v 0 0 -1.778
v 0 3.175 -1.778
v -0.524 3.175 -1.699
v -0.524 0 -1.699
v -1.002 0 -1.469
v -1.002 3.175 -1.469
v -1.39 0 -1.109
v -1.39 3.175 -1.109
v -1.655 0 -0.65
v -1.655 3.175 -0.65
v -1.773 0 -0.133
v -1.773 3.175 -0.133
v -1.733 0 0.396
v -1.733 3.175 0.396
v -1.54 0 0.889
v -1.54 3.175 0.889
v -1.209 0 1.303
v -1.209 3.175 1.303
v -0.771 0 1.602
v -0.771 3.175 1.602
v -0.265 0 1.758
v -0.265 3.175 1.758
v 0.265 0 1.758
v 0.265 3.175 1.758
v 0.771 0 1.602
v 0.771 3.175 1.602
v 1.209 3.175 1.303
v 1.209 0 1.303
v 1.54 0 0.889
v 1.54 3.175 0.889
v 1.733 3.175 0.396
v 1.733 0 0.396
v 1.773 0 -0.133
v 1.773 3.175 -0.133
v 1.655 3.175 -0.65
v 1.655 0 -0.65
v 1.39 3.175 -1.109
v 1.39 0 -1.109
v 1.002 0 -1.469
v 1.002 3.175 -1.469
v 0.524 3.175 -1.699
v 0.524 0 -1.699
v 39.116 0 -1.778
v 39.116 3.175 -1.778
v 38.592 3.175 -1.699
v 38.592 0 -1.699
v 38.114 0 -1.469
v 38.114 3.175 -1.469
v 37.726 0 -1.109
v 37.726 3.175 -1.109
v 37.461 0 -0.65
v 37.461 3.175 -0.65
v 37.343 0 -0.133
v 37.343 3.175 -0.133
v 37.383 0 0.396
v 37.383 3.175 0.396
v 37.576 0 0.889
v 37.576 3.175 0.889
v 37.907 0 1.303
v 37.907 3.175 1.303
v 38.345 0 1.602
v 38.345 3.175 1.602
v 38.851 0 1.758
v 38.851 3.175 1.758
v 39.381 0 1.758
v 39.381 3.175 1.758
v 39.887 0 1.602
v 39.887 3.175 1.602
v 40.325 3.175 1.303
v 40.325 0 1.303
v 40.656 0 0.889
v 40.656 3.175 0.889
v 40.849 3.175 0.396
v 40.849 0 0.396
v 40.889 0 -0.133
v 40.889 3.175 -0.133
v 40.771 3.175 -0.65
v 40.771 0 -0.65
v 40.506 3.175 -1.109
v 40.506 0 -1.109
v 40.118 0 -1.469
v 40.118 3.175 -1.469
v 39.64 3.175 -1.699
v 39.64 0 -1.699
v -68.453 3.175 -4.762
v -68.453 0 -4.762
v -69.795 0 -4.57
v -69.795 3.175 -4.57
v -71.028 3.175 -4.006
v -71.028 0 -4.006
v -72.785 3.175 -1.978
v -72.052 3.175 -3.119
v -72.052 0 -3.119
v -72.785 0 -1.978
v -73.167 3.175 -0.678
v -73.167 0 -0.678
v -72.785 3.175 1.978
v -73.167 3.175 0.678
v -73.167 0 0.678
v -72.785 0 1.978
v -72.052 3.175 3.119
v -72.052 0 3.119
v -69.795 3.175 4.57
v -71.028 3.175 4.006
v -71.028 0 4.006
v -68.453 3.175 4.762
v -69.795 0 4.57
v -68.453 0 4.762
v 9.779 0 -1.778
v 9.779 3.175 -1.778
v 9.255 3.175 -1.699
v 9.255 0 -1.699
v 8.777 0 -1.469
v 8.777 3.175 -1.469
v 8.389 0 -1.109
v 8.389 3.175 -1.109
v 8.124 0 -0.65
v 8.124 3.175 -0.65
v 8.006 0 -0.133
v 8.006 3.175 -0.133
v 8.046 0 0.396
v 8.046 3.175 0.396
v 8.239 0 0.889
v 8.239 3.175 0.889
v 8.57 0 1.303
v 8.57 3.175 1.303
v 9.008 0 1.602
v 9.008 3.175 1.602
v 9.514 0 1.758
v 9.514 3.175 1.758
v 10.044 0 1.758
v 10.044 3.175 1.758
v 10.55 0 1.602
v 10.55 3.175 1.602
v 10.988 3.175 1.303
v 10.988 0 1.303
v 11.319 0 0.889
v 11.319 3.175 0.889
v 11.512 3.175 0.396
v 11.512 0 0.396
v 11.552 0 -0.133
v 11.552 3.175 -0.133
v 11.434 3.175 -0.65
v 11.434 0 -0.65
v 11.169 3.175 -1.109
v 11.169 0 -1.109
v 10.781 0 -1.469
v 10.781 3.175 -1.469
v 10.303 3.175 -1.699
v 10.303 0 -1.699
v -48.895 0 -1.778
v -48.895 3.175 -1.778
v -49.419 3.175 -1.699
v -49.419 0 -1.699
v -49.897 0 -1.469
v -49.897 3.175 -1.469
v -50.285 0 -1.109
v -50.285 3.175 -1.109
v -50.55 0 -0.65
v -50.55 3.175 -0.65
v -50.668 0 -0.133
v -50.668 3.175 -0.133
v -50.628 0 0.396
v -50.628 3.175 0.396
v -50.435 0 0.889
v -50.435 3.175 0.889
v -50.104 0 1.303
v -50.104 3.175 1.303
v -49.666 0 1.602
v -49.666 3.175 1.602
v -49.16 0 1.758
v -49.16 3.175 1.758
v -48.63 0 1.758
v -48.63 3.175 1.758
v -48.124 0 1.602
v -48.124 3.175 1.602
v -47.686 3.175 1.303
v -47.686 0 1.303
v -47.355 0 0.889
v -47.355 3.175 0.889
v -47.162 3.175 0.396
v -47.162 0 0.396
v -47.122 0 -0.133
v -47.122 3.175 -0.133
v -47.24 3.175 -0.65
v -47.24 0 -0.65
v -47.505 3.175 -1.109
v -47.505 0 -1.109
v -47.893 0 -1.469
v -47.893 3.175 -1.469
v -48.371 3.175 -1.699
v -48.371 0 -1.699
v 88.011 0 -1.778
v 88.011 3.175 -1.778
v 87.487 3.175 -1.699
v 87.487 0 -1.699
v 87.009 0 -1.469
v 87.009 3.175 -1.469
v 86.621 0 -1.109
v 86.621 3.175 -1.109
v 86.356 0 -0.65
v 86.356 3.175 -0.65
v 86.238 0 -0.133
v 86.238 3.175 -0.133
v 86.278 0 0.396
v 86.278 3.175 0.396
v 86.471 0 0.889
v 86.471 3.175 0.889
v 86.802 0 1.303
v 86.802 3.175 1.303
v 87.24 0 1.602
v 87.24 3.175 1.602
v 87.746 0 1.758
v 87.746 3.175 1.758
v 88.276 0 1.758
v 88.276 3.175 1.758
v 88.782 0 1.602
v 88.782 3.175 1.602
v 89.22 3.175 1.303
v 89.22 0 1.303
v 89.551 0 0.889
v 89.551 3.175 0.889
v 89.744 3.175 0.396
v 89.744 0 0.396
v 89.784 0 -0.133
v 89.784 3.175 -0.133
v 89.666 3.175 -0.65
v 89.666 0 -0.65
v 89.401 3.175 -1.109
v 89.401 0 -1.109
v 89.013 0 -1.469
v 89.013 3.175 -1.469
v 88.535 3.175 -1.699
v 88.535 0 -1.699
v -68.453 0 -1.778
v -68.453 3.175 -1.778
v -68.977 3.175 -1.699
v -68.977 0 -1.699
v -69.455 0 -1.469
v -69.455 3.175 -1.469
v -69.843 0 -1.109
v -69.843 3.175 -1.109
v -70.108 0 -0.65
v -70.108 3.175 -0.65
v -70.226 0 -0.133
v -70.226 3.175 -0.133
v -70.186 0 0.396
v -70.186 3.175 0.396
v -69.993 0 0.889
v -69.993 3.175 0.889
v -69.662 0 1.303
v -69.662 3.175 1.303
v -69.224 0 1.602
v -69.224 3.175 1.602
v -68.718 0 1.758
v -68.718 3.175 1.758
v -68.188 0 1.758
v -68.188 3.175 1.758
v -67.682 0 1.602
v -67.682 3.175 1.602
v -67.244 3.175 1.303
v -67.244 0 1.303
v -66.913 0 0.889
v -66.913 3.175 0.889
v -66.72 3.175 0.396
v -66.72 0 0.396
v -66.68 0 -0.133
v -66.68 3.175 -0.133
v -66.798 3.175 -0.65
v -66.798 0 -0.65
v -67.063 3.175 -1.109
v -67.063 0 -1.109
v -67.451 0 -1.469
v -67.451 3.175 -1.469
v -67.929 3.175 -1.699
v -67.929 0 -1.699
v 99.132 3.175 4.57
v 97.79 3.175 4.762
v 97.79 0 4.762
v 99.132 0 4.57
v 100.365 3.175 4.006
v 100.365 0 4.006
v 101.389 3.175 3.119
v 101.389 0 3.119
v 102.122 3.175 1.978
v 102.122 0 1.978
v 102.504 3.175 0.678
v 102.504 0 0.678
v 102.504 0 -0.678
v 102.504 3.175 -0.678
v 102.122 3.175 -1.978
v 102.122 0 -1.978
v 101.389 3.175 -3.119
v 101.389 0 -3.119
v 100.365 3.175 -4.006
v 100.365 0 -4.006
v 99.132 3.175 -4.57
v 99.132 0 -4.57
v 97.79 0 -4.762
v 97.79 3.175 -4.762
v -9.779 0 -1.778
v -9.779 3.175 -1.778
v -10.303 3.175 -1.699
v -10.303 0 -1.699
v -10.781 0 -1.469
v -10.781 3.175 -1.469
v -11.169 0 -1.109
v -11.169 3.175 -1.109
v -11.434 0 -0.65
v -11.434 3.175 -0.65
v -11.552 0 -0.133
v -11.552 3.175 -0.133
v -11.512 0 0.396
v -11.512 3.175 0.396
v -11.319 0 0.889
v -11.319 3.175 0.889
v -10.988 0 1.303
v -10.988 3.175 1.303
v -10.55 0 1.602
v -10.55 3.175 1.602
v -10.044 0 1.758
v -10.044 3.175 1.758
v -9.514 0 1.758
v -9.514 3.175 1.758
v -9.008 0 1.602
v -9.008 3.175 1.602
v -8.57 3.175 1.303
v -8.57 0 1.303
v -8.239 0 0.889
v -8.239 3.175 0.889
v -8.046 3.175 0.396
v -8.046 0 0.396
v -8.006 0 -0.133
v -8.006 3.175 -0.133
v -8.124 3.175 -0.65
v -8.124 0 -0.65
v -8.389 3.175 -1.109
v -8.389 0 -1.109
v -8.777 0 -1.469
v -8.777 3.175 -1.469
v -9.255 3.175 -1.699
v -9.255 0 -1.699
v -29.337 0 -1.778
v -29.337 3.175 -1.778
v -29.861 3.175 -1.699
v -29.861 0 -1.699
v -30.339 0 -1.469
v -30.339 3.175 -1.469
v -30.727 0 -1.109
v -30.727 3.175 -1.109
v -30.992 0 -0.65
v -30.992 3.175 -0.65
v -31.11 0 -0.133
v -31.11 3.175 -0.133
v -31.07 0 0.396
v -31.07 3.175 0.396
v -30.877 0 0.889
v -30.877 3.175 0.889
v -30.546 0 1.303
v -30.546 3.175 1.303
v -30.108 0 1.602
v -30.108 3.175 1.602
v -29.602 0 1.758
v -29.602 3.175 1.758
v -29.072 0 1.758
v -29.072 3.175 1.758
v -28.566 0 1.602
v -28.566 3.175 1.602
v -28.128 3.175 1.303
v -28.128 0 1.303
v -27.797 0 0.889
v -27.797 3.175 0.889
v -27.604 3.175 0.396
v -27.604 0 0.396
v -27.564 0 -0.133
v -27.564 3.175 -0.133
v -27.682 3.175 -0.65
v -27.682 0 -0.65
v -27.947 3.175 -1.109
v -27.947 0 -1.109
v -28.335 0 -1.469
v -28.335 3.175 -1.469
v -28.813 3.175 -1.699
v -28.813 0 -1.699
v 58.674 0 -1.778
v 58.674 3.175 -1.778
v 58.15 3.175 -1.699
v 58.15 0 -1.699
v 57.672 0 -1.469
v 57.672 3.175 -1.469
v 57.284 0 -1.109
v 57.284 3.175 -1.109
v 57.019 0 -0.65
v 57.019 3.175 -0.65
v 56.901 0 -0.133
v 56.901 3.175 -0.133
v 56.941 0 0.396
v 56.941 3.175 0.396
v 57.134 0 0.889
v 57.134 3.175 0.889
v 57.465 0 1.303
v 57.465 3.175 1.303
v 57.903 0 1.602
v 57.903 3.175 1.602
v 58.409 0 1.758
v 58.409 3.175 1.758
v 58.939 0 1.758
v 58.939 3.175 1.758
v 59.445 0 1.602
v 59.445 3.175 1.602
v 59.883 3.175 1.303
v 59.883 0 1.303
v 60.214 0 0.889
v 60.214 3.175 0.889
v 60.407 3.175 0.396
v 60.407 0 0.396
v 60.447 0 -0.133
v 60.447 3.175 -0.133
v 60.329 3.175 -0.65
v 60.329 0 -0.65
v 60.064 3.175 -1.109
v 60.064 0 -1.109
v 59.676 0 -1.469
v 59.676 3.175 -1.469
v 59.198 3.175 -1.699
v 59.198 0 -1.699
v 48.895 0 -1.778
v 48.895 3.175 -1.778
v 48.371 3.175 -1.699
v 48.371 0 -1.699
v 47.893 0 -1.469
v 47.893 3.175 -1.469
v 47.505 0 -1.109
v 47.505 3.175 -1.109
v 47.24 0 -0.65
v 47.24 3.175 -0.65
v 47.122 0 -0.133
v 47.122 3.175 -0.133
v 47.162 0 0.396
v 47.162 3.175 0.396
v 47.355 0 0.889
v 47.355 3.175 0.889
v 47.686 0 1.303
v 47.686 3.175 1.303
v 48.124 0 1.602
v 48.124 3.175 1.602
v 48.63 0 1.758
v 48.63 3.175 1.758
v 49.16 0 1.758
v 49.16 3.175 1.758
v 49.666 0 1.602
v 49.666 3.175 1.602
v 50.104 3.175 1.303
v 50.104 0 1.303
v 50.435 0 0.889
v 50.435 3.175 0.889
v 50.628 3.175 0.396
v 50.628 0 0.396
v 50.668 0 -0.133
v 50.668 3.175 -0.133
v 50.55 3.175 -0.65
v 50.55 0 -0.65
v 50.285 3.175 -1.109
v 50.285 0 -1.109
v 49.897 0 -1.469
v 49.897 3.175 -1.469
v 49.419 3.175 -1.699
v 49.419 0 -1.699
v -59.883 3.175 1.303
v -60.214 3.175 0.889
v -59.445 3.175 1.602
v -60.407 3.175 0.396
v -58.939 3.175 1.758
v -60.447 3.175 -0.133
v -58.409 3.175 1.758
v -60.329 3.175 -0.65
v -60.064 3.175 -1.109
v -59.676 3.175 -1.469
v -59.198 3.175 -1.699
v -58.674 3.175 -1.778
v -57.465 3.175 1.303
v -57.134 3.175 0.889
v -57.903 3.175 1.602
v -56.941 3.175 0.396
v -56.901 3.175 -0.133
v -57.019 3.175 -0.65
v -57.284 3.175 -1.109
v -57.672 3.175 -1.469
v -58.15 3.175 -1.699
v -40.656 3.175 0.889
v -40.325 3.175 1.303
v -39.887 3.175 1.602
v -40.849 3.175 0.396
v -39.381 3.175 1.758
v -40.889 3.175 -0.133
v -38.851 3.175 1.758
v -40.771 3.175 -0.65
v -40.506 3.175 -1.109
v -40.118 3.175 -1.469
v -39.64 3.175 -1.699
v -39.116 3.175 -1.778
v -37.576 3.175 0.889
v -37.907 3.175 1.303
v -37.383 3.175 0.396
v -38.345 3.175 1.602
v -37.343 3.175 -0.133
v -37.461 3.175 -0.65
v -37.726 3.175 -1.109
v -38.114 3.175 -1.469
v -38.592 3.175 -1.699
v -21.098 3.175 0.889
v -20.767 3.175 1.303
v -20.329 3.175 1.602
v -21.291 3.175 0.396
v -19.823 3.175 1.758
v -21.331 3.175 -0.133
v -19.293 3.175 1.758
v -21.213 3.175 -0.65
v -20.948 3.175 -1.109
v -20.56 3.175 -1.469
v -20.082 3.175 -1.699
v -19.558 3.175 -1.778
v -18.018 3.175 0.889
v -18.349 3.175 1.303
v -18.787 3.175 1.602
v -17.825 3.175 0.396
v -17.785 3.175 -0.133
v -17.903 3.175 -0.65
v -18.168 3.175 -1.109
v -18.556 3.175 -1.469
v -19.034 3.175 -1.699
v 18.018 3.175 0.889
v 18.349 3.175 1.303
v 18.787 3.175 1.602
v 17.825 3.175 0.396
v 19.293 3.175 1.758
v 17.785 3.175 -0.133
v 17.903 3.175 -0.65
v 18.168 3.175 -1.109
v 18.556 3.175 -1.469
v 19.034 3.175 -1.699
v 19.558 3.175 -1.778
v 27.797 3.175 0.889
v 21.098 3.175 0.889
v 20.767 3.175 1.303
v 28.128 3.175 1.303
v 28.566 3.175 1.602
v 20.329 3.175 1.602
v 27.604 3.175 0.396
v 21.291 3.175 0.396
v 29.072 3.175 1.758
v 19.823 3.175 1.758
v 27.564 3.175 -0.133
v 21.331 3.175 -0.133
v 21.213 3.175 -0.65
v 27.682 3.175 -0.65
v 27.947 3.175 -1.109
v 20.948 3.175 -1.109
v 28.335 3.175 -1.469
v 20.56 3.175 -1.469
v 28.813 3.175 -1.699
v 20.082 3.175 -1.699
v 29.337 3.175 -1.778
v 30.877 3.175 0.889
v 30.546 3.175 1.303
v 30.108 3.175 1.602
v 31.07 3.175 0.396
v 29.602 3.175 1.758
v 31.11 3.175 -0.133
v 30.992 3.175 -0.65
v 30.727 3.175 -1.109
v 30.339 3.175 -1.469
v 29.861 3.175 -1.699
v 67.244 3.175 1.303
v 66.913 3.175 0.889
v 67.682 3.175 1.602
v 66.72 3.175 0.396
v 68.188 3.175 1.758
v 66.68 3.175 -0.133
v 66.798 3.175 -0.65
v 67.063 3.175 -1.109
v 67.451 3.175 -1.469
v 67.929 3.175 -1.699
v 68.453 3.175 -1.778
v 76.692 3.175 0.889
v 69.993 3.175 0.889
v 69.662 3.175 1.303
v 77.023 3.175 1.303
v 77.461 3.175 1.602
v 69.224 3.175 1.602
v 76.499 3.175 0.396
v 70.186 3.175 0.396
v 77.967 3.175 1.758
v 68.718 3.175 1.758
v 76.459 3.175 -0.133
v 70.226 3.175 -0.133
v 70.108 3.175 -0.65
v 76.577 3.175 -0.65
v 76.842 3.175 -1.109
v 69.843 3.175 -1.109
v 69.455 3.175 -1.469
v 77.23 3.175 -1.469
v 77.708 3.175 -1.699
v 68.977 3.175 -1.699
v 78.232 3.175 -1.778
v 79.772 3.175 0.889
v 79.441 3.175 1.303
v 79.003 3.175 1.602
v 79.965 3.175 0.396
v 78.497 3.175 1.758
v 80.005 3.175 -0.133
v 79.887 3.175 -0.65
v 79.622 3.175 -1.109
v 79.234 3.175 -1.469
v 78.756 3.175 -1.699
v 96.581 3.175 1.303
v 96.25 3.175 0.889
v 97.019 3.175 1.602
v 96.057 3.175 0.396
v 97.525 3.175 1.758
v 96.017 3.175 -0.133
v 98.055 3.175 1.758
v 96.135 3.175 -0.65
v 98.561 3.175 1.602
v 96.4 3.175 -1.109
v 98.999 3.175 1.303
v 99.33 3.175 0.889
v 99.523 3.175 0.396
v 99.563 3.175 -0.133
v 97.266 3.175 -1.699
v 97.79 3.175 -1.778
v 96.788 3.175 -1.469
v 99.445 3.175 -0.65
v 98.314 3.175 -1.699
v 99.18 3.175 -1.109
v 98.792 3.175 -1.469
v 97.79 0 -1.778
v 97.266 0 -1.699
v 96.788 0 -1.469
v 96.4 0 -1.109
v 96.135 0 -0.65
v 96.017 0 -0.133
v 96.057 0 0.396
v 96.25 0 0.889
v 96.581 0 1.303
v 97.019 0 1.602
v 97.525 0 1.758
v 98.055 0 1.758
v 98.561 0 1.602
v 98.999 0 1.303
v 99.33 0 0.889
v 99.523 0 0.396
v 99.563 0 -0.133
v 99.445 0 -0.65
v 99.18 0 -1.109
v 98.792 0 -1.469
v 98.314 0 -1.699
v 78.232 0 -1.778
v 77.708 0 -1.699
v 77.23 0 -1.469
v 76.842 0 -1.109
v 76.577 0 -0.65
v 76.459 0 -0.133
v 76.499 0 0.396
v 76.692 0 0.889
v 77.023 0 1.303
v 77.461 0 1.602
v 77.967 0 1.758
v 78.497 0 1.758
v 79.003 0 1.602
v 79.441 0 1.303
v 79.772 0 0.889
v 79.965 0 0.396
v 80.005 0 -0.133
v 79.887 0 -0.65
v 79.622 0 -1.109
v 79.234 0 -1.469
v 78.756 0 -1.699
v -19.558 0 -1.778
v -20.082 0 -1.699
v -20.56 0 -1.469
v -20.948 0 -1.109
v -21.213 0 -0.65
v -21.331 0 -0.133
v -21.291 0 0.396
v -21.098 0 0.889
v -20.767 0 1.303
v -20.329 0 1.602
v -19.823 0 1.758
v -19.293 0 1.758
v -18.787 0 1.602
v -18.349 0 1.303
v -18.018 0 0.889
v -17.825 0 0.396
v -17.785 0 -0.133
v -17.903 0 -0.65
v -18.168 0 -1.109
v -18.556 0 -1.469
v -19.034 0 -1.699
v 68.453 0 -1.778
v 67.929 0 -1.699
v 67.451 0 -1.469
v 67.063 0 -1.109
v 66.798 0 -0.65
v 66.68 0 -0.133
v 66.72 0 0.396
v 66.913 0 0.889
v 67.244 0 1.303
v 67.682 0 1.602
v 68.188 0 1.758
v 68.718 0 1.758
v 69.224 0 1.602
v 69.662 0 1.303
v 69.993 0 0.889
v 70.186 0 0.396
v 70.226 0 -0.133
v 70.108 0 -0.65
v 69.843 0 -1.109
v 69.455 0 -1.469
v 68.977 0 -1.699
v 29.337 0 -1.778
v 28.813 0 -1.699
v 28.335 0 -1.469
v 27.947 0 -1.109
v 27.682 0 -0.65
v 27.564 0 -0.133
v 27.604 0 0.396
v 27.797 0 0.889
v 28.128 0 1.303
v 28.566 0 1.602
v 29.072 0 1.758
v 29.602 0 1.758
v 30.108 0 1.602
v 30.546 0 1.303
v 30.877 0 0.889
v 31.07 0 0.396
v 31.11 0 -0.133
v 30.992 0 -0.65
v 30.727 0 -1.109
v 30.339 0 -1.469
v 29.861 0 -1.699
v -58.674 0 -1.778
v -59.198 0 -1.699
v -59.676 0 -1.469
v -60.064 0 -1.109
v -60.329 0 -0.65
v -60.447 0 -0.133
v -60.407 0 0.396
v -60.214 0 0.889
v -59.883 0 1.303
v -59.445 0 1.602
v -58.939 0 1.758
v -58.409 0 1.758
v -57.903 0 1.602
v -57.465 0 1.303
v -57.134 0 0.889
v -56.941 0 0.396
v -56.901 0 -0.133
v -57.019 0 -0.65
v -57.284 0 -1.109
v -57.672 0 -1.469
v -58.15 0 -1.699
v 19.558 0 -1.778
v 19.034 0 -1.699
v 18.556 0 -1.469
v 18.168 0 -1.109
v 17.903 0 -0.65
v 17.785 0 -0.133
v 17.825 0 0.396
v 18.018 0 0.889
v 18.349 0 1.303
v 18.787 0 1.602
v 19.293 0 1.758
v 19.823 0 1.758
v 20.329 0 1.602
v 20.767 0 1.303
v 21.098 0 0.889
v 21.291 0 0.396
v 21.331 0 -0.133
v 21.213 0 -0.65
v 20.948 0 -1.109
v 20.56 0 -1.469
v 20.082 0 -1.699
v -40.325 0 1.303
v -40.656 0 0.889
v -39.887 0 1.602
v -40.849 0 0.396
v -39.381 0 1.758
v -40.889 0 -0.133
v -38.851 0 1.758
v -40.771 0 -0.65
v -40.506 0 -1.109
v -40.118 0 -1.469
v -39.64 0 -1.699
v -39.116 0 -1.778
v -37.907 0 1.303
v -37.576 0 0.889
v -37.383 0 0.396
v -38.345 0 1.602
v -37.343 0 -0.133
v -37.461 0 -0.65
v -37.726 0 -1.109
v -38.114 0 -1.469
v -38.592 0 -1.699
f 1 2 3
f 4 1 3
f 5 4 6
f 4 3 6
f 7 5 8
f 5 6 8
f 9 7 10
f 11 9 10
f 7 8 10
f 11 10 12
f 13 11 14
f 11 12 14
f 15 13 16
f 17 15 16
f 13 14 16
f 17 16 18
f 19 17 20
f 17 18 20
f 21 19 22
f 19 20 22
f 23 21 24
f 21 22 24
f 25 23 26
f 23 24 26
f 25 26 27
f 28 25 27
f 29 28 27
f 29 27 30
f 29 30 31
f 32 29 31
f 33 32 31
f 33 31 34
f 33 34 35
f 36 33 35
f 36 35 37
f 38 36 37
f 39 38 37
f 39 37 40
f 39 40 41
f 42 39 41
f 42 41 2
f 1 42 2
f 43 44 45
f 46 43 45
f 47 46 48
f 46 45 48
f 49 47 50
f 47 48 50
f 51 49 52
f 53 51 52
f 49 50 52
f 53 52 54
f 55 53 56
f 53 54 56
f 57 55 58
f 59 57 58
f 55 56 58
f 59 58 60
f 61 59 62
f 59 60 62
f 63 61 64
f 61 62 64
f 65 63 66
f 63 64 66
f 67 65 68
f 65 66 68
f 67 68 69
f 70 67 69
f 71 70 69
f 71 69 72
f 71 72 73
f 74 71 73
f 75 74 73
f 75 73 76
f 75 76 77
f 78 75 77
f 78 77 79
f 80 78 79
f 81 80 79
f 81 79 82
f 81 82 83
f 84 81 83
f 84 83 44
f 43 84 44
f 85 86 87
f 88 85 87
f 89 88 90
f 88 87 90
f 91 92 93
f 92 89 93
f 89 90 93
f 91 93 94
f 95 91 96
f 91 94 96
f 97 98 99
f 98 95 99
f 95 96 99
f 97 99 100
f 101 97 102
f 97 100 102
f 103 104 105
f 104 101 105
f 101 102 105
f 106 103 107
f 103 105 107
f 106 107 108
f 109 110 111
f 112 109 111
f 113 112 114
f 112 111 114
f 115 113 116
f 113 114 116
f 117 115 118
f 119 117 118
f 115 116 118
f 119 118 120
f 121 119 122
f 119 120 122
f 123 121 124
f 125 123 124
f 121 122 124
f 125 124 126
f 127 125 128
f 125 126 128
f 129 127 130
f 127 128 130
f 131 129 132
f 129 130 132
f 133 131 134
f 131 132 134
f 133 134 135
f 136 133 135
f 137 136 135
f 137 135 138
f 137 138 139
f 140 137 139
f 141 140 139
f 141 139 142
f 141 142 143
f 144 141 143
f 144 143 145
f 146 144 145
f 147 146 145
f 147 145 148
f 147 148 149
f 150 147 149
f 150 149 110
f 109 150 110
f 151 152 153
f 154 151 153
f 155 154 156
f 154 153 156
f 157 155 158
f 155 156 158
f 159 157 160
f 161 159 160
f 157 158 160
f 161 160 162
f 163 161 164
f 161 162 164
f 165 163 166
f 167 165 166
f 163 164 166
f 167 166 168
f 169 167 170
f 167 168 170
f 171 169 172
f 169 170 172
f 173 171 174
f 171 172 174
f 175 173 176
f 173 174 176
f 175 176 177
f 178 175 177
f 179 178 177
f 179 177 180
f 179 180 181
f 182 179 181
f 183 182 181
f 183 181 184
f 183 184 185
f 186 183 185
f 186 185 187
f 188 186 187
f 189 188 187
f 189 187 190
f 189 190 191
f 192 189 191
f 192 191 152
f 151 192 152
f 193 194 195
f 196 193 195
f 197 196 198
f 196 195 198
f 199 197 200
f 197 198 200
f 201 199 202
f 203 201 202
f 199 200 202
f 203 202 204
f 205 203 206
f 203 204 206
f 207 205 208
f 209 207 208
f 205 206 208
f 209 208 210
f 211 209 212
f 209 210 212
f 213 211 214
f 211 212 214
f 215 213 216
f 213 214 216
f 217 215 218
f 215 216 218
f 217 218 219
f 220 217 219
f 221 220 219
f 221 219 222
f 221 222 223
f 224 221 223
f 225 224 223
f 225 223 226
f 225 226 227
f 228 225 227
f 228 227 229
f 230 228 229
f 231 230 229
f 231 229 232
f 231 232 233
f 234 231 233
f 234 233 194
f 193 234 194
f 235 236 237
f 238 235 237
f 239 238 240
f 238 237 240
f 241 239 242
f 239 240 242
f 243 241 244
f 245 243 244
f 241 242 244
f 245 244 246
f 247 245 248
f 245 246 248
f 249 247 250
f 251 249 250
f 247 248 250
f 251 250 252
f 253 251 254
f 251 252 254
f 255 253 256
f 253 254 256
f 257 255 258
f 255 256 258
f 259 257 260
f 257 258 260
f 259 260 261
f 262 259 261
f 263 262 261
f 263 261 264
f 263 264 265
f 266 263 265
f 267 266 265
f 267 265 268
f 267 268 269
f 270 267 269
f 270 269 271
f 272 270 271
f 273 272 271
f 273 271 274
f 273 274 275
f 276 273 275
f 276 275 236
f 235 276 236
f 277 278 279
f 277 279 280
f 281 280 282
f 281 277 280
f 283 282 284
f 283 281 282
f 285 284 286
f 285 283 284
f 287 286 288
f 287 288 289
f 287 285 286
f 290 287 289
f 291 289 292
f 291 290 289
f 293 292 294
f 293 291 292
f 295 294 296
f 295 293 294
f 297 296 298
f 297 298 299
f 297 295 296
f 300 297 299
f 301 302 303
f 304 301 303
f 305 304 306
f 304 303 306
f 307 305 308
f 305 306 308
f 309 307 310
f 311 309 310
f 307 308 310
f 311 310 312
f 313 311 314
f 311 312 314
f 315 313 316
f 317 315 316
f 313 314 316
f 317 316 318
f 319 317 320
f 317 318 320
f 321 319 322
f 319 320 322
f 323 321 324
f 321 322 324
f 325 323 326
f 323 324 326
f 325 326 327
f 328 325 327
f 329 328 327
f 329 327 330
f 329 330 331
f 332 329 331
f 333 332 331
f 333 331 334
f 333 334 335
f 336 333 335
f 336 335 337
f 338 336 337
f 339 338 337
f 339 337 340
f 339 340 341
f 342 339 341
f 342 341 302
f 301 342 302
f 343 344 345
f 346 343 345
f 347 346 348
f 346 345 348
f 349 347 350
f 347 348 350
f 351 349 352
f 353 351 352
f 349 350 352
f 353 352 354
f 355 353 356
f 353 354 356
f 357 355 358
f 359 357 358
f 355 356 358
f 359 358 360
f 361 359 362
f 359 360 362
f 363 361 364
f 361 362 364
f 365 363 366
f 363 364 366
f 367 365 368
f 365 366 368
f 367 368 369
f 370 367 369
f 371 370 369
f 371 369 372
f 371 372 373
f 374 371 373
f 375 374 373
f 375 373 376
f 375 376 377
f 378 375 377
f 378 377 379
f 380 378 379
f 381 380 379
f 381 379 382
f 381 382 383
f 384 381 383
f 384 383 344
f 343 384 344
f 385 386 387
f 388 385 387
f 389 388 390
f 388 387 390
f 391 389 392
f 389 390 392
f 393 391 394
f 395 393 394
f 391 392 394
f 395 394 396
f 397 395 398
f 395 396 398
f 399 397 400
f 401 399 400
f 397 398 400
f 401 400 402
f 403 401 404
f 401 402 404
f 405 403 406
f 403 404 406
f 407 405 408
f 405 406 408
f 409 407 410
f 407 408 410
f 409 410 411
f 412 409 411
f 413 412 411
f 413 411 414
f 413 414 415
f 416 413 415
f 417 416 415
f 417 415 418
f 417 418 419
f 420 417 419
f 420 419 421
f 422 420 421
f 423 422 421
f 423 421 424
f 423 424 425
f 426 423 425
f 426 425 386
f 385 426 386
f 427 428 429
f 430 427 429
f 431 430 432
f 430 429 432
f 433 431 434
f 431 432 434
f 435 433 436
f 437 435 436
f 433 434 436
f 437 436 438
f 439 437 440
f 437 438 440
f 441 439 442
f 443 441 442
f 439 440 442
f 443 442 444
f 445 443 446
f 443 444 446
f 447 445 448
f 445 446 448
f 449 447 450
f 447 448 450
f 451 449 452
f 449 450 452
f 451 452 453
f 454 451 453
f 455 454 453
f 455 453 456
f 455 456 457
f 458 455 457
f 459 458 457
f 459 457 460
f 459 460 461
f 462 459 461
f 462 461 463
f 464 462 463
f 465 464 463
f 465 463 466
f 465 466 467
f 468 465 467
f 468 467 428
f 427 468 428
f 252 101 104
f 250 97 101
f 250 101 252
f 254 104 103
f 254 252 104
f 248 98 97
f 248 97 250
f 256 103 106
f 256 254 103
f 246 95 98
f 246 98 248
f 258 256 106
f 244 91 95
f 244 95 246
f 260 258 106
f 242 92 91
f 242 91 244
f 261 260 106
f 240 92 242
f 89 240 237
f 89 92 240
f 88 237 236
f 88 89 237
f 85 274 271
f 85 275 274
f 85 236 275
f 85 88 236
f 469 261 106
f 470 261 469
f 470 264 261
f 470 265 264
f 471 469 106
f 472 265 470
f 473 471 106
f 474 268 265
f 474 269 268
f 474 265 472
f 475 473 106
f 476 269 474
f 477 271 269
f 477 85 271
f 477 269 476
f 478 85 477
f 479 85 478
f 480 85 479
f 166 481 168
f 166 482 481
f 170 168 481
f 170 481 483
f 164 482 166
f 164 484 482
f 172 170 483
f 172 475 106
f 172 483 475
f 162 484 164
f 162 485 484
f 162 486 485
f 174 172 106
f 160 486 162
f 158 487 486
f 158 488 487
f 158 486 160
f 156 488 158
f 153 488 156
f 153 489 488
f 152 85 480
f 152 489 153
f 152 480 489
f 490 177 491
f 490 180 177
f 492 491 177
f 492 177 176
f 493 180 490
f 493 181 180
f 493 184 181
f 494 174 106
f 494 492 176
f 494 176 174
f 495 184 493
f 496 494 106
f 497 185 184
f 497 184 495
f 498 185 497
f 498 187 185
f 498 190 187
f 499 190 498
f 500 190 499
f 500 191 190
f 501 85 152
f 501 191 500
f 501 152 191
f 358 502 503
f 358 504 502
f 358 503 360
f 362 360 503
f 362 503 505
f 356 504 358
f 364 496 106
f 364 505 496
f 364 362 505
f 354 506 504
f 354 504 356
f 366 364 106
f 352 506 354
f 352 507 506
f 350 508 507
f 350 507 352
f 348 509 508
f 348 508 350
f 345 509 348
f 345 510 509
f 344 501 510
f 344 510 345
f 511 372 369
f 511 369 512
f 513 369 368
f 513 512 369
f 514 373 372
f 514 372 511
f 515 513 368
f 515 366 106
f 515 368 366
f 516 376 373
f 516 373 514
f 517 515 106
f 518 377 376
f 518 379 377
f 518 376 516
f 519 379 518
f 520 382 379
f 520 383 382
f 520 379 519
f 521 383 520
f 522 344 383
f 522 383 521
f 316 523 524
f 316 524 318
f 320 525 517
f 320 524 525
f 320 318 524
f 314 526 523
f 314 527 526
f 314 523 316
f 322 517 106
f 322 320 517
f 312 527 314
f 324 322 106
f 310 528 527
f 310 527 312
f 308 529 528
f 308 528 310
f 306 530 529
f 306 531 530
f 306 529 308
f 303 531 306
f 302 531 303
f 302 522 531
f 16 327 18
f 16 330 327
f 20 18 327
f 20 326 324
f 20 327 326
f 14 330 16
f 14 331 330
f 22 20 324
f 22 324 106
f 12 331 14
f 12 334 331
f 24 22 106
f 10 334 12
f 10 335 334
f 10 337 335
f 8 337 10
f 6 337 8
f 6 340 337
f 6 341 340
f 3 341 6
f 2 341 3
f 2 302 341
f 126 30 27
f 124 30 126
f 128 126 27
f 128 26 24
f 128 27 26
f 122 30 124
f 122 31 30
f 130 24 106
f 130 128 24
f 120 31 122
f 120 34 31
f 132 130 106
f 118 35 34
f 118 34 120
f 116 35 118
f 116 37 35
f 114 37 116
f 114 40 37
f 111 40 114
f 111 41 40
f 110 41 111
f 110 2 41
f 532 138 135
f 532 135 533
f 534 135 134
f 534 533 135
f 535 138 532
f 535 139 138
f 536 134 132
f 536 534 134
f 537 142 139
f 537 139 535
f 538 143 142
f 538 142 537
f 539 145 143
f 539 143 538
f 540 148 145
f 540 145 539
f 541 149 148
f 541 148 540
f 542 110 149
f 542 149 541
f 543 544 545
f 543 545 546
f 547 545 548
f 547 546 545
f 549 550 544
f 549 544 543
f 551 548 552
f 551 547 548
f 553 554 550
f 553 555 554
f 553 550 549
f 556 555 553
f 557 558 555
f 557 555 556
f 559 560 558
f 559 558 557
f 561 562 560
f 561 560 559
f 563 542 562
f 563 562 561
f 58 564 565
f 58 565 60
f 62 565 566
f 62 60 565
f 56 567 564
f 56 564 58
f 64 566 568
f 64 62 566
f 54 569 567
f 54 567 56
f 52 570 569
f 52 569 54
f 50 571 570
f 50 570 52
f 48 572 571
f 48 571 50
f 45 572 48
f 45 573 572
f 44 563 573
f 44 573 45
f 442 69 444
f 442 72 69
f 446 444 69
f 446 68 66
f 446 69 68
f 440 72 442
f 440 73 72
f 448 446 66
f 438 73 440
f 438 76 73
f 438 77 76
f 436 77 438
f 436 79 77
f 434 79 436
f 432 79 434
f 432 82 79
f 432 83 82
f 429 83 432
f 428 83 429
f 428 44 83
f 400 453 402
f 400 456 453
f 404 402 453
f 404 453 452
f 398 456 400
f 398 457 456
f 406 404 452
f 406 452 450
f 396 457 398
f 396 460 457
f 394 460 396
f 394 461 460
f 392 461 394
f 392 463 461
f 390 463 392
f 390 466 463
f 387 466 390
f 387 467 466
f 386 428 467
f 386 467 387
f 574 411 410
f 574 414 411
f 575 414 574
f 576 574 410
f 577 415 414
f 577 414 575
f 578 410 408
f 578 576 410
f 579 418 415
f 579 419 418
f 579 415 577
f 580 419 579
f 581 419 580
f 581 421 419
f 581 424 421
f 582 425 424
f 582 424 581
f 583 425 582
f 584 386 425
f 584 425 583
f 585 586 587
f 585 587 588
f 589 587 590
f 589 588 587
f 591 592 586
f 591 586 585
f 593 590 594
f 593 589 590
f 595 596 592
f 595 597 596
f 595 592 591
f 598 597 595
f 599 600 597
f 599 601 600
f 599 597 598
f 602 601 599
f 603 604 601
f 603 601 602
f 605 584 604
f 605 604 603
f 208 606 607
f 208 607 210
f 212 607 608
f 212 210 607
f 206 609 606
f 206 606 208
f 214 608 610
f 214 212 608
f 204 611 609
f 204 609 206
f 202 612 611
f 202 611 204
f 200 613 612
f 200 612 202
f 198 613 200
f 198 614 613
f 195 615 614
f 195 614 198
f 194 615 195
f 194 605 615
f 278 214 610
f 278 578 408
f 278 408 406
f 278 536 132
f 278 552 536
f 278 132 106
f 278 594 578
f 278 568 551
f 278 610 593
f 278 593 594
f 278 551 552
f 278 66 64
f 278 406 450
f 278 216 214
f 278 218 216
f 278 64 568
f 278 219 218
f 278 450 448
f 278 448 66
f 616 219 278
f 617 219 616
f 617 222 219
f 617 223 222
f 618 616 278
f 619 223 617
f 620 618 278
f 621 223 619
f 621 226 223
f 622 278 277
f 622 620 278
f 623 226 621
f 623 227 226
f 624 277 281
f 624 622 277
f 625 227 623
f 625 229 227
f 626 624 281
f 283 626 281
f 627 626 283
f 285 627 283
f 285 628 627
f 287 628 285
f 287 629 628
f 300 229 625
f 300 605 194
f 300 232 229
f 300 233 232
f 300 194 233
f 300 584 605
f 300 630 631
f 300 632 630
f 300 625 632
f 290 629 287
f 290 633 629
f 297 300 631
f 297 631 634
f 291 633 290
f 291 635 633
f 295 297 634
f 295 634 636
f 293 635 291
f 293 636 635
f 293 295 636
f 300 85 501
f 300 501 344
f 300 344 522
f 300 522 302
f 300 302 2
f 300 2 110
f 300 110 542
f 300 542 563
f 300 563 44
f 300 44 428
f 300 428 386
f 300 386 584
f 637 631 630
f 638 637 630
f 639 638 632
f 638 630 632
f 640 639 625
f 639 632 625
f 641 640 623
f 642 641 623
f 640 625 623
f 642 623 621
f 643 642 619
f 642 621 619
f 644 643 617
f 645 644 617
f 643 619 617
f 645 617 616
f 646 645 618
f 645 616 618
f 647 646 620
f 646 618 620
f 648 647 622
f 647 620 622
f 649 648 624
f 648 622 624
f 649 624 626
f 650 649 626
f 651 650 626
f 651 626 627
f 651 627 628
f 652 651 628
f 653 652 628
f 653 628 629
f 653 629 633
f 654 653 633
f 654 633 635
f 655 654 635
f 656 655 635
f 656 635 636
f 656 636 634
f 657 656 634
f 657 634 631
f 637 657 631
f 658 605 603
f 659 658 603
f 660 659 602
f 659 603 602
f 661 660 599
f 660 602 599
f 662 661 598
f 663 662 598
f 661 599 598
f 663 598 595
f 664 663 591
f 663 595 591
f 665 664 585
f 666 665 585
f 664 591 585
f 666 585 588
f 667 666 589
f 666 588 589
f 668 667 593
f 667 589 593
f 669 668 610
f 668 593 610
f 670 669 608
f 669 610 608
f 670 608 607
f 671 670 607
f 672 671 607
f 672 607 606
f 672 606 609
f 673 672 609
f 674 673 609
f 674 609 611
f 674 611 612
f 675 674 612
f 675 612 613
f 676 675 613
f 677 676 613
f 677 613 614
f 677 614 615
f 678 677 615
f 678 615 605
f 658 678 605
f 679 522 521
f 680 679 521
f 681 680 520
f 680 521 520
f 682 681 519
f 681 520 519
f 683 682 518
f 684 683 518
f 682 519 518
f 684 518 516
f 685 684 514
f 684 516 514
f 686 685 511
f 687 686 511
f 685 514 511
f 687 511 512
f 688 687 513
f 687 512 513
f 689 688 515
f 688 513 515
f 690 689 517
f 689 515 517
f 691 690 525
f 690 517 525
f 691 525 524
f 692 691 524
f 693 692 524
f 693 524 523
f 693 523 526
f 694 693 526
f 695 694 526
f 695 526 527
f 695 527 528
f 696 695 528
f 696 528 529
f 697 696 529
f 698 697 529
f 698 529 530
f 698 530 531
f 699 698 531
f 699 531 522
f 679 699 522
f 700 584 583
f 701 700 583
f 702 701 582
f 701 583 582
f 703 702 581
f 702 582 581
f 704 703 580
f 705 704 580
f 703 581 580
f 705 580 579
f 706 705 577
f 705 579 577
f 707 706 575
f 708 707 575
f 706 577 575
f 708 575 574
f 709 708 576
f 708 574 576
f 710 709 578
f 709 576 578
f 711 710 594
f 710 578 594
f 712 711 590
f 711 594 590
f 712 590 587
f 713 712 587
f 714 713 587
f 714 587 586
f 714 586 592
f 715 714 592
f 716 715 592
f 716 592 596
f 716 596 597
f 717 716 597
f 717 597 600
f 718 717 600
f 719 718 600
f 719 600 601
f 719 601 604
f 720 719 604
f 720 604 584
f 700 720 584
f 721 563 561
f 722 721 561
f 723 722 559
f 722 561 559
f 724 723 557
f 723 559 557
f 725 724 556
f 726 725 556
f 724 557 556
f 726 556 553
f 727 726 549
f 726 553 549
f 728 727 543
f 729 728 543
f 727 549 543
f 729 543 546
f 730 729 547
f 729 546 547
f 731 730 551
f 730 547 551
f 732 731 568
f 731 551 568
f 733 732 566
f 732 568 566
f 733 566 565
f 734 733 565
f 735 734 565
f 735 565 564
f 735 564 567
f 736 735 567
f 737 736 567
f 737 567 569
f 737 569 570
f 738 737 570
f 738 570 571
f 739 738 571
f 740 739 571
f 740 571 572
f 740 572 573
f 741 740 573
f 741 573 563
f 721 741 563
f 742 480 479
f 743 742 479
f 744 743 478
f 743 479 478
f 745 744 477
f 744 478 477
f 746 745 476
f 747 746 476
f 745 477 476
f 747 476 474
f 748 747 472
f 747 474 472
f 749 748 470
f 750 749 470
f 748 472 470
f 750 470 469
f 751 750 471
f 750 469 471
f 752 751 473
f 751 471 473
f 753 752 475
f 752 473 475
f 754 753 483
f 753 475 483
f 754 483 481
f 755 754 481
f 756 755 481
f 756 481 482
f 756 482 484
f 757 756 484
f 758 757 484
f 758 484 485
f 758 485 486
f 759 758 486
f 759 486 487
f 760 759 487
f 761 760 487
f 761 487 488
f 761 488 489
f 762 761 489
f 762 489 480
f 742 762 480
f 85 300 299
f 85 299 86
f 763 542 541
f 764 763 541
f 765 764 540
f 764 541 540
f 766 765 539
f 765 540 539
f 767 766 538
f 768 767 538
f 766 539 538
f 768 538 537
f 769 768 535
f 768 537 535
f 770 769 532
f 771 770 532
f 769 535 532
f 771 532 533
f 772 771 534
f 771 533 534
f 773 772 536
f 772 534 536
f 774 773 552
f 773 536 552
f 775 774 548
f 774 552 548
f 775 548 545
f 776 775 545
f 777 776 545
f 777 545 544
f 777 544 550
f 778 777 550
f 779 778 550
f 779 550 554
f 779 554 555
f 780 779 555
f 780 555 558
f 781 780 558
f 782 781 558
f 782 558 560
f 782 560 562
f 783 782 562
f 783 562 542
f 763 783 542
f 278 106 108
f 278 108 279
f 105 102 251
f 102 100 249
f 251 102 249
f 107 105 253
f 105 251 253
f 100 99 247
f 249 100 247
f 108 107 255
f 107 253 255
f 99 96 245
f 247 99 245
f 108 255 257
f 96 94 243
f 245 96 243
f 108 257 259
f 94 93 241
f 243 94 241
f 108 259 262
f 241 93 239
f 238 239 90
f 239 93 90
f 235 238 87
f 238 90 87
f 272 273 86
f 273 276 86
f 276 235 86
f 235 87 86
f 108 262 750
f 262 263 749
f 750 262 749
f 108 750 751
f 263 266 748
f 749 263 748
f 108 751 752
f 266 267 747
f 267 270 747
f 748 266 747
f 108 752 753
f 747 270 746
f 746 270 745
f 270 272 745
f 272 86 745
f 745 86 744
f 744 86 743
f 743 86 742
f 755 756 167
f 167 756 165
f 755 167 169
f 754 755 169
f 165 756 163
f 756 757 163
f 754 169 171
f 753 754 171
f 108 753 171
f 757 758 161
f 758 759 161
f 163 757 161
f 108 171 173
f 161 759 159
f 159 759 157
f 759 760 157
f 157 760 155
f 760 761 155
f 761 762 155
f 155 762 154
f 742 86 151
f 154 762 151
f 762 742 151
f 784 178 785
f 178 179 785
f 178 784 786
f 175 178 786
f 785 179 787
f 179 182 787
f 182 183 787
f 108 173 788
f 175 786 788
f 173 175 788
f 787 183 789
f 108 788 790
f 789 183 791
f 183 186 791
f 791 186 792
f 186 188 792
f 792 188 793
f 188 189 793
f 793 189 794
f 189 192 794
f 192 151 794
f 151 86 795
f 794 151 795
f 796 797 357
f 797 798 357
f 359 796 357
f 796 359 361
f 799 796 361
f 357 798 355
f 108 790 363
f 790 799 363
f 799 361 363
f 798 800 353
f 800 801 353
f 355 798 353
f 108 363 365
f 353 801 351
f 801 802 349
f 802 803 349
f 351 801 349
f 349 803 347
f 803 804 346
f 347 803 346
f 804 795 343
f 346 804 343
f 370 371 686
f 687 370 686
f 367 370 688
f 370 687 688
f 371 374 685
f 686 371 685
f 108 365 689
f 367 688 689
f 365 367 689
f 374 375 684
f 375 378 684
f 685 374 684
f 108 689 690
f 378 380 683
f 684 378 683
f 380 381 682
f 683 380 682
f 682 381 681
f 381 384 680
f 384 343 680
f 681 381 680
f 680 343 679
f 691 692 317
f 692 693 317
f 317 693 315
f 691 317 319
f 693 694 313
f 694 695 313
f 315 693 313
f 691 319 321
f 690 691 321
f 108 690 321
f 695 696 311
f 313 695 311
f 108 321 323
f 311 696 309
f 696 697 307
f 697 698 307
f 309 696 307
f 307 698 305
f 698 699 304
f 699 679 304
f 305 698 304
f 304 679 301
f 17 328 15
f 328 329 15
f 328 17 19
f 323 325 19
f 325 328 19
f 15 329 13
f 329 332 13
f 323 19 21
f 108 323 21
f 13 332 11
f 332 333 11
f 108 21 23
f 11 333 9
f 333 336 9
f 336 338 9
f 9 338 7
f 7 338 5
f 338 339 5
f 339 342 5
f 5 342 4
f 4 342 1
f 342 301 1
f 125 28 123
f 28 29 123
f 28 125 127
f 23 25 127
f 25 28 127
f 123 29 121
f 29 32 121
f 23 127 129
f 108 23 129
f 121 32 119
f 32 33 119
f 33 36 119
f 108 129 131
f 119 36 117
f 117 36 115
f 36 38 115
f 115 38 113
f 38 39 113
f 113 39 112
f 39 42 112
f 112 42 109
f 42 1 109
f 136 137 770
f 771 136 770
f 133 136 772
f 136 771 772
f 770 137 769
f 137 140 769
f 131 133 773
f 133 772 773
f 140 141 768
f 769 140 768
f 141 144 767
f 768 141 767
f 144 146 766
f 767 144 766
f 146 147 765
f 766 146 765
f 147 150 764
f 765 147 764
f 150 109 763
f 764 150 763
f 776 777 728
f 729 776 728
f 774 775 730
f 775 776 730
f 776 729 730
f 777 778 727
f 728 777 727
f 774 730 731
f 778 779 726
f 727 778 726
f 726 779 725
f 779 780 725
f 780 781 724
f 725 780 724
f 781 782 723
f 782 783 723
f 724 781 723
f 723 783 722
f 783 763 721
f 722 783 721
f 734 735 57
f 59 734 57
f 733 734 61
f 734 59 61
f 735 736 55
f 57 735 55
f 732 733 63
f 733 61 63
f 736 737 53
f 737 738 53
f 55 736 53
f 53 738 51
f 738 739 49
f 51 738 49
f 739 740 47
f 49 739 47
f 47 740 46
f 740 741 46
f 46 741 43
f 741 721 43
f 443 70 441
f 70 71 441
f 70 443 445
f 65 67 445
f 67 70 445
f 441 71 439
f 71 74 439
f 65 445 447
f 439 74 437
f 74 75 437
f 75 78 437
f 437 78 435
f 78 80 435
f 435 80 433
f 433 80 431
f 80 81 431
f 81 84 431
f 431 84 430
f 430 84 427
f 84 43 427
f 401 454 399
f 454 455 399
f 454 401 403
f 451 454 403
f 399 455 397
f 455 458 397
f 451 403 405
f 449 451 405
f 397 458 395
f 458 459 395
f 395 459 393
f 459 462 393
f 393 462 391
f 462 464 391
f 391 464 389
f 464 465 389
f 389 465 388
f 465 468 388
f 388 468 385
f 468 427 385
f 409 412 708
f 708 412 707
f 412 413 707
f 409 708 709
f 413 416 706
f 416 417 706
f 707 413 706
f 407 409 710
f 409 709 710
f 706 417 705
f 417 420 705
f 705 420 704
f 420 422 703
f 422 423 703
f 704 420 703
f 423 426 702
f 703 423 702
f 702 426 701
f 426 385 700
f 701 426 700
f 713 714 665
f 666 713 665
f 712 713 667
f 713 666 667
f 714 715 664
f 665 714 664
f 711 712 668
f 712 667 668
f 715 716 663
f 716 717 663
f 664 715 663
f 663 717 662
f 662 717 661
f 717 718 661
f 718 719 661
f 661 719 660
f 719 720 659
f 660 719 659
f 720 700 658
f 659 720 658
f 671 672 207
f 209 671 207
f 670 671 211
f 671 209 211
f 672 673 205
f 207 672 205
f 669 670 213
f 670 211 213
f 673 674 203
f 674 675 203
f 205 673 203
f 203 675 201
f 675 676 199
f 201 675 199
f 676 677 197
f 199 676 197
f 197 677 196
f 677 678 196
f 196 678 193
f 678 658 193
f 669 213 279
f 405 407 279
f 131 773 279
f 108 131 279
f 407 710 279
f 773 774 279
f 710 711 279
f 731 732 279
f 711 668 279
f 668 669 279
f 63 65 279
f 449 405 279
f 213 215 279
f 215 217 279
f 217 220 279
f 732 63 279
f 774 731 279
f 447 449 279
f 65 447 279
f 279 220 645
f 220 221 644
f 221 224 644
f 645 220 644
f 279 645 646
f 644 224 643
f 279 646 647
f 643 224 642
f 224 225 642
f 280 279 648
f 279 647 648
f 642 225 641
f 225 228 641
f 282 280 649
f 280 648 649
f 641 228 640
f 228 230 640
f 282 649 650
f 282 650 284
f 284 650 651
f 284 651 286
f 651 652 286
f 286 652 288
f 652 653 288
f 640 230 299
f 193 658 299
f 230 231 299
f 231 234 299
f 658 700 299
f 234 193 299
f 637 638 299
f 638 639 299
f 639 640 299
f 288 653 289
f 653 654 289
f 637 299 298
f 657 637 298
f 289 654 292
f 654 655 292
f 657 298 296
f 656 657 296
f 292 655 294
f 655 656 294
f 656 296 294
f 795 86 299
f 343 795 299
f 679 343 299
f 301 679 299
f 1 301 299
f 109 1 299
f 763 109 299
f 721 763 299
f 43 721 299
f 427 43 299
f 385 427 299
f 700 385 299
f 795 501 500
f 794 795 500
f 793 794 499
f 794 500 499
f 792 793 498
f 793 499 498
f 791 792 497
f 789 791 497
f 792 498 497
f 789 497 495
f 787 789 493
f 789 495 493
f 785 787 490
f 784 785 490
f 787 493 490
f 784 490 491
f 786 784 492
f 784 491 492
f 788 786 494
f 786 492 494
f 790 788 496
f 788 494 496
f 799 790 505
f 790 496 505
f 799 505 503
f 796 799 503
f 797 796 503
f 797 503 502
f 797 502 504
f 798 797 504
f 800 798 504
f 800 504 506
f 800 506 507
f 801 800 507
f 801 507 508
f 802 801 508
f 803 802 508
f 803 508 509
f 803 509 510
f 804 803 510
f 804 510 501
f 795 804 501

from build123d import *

# Parameters (mm, degrees)
SKETCH1_R               = 1.778
BOSS_EXTRUDE1_DEPTH     = 6.35
CUT_EXTRUDE1_DEPTH      = 103.859220114
CUT_EXTRUDE1_DEPTH_BACK = 103.859220114
SKETCH3_W               = 243.845776737
SKETCH3_H               = 94.534413445
CUT_EXTRUDE2_DEPTH      = 3.175


with BuildPart() as part:
    # Sketch1 → Boss-Extrude1 (new body)
    with BuildSketch(Plane(origin=(0, 6.35, 0), x_dir=(1, 0, 0), z_dir=(0, 1, 0))):
        with BuildLine():
            Line((97.79, 4.7625), (-97.79, 4.7625))
            ThreePointArc((-97.79, 4.7625), (-102.5525, 0), (-97.79, -4.7625))
            Line((-97.79, -4.7625), (97.79, -4.7625))
            ThreePointArc((97.79, -4.7625), (102.5525, 0), (97.79, 4.7625))
        make_face()
        with Locations(Location((97.79, 0, 0), (0, 0, 90))):
            Circle(SKETCH1_R, mode=Mode.SUBTRACT)
        with Locations(Location((88.011, 0, 0), (0, 0, 90))):
            Circle(SKETCH1_R, mode=Mode.SUBTRACT)
        with Locations(Location((78.232, 0, 0), (0, 0, 90))):
            Circle(SKETCH1_R, mode=Mode.SUBTRACT)
        with Locations(Location((68.453, 0, 0), (0, 0, 90))):
            Circle(SKETCH1_R, mode=Mode.SUBTRACT)
        with Locations(Location((58.674, 0, 0), (0, 0, 90))):
            Circle(SKETCH1_R, mode=Mode.SUBTRACT)
        with Locations(Location((48.895, 0, 0), (0, 0, 90))):
            Circle(SKETCH1_R, mode=Mode.SUBTRACT)
        with Locations(Location((39.116, 0, 0), (0, 0, 90))):
            Circle(SKETCH1_R, mode=Mode.SUBTRACT)
        with Locations(Location((29.337, 0, 0), (0, 0, 90))):
            Circle(SKETCH1_R, mode=Mode.SUBTRACT)
        with Locations(Location((19.558, 0, 0), (0, 0, 90))):
            Circle(SKETCH1_R, mode=Mode.SUBTRACT)
        with Locations(Location((9.779, 0, 0), (0, 0, 90))):
            Circle(SKETCH1_R, mode=Mode.SUBTRACT)
        with Locations(Location((0, 0, 0), (0, 0, 90))):
            Circle(SKETCH1_R, mode=Mode.SUBTRACT)
        with Locations(Location((-9.779, 0, 0), (0, 0, 90))):
            Circle(SKETCH1_R, mode=Mode.SUBTRACT)
        with Locations(Location((-19.558, 0, 0), (0, 0, 90))):
            Circle(SKETCH1_R, mode=Mode.SUBTRACT)
        with Locations(Location((-29.337, 0, 0), (0, 0, 90))):
            Circle(SKETCH1_R, mode=Mode.SUBTRACT)
        with Locations(Location((-39.116, 0, 0), (0, 0, 90))):
            Circle(SKETCH1_R, mode=Mode.SUBTRACT)
        with Locations(Location((-48.895, 0, 0), (0, 0, 90))):
            Circle(SKETCH1_R, mode=Mode.SUBTRACT)
        with Locations(Location((-58.674, 0, 0), (0, 0, 90))):
            Circle(SKETCH1_R, mode=Mode.SUBTRACT)
        with Locations(Location((-68.453, 0, 0), (0, 0, 90))):
            Circle(SKETCH1_R, mode=Mode.SUBTRACT)
        with Locations(Location((-78.232, 0, 0), (0, 0, 90))):
            Circle(SKETCH1_R, mode=Mode.SUBTRACT)
        with Locations(Location((-88.011, 0, 0), (0, 0, 90))):
            Circle(SKETCH1_R, mode=Mode.SUBTRACT)
        with Locations(Location((-97.79, 0, 0), (0, 0, 90))):
            Circle(SKETCH1_R, mode=Mode.SUBTRACT)
    extrude(amount=-BOSS_EXTRUDE1_DEPTH)

    # Sketch2 → Cut-Extrude1 (cut, two sides: drawn at the far end of the back side and taken through both)
    with BuildSketch(Plane(origin=(0, 6.35, 0), x_dir=(1, 0, 0), z_dir=(0, 1, 0)).offset(-CUT_EXTRUDE1_DEPTH_BACK)):
        with BuildLine():
            Line((-68.453, -4.7625), (-109.387336875, -4.7625))
            Line((-109.387336875, -4.7625), (-109.387336875, 4.7625))
            Line((-109.387336875, 4.7625), (-68.453, 4.7625))
            ThreePointArc((-68.453, 4.7625), (-73.2155, 0), (-68.453, -4.7625))
        make_face()
    extrude(amount=CUT_EXTRUDE1_DEPTH + CUT_EXTRUDE1_DEPTH_BACK, mode=Mode.SUBTRACT)

    # Sketch3 → Cut-Extrude2 (cut)
    with BuildSketch(Plane(origin=(0, 6.35, 0), x_dir=(1, 0, 0), z_dir=(0, 1, 0))):
        with Locations((-6.250363069, -2.208747977)):
            Rectangle(SKETCH3_W, SKETCH3_H)
    extrude(amount=-CUT_EXTRUDE2_DEPTH, mode=Mode.SUBTRACT)


solid = part.part
